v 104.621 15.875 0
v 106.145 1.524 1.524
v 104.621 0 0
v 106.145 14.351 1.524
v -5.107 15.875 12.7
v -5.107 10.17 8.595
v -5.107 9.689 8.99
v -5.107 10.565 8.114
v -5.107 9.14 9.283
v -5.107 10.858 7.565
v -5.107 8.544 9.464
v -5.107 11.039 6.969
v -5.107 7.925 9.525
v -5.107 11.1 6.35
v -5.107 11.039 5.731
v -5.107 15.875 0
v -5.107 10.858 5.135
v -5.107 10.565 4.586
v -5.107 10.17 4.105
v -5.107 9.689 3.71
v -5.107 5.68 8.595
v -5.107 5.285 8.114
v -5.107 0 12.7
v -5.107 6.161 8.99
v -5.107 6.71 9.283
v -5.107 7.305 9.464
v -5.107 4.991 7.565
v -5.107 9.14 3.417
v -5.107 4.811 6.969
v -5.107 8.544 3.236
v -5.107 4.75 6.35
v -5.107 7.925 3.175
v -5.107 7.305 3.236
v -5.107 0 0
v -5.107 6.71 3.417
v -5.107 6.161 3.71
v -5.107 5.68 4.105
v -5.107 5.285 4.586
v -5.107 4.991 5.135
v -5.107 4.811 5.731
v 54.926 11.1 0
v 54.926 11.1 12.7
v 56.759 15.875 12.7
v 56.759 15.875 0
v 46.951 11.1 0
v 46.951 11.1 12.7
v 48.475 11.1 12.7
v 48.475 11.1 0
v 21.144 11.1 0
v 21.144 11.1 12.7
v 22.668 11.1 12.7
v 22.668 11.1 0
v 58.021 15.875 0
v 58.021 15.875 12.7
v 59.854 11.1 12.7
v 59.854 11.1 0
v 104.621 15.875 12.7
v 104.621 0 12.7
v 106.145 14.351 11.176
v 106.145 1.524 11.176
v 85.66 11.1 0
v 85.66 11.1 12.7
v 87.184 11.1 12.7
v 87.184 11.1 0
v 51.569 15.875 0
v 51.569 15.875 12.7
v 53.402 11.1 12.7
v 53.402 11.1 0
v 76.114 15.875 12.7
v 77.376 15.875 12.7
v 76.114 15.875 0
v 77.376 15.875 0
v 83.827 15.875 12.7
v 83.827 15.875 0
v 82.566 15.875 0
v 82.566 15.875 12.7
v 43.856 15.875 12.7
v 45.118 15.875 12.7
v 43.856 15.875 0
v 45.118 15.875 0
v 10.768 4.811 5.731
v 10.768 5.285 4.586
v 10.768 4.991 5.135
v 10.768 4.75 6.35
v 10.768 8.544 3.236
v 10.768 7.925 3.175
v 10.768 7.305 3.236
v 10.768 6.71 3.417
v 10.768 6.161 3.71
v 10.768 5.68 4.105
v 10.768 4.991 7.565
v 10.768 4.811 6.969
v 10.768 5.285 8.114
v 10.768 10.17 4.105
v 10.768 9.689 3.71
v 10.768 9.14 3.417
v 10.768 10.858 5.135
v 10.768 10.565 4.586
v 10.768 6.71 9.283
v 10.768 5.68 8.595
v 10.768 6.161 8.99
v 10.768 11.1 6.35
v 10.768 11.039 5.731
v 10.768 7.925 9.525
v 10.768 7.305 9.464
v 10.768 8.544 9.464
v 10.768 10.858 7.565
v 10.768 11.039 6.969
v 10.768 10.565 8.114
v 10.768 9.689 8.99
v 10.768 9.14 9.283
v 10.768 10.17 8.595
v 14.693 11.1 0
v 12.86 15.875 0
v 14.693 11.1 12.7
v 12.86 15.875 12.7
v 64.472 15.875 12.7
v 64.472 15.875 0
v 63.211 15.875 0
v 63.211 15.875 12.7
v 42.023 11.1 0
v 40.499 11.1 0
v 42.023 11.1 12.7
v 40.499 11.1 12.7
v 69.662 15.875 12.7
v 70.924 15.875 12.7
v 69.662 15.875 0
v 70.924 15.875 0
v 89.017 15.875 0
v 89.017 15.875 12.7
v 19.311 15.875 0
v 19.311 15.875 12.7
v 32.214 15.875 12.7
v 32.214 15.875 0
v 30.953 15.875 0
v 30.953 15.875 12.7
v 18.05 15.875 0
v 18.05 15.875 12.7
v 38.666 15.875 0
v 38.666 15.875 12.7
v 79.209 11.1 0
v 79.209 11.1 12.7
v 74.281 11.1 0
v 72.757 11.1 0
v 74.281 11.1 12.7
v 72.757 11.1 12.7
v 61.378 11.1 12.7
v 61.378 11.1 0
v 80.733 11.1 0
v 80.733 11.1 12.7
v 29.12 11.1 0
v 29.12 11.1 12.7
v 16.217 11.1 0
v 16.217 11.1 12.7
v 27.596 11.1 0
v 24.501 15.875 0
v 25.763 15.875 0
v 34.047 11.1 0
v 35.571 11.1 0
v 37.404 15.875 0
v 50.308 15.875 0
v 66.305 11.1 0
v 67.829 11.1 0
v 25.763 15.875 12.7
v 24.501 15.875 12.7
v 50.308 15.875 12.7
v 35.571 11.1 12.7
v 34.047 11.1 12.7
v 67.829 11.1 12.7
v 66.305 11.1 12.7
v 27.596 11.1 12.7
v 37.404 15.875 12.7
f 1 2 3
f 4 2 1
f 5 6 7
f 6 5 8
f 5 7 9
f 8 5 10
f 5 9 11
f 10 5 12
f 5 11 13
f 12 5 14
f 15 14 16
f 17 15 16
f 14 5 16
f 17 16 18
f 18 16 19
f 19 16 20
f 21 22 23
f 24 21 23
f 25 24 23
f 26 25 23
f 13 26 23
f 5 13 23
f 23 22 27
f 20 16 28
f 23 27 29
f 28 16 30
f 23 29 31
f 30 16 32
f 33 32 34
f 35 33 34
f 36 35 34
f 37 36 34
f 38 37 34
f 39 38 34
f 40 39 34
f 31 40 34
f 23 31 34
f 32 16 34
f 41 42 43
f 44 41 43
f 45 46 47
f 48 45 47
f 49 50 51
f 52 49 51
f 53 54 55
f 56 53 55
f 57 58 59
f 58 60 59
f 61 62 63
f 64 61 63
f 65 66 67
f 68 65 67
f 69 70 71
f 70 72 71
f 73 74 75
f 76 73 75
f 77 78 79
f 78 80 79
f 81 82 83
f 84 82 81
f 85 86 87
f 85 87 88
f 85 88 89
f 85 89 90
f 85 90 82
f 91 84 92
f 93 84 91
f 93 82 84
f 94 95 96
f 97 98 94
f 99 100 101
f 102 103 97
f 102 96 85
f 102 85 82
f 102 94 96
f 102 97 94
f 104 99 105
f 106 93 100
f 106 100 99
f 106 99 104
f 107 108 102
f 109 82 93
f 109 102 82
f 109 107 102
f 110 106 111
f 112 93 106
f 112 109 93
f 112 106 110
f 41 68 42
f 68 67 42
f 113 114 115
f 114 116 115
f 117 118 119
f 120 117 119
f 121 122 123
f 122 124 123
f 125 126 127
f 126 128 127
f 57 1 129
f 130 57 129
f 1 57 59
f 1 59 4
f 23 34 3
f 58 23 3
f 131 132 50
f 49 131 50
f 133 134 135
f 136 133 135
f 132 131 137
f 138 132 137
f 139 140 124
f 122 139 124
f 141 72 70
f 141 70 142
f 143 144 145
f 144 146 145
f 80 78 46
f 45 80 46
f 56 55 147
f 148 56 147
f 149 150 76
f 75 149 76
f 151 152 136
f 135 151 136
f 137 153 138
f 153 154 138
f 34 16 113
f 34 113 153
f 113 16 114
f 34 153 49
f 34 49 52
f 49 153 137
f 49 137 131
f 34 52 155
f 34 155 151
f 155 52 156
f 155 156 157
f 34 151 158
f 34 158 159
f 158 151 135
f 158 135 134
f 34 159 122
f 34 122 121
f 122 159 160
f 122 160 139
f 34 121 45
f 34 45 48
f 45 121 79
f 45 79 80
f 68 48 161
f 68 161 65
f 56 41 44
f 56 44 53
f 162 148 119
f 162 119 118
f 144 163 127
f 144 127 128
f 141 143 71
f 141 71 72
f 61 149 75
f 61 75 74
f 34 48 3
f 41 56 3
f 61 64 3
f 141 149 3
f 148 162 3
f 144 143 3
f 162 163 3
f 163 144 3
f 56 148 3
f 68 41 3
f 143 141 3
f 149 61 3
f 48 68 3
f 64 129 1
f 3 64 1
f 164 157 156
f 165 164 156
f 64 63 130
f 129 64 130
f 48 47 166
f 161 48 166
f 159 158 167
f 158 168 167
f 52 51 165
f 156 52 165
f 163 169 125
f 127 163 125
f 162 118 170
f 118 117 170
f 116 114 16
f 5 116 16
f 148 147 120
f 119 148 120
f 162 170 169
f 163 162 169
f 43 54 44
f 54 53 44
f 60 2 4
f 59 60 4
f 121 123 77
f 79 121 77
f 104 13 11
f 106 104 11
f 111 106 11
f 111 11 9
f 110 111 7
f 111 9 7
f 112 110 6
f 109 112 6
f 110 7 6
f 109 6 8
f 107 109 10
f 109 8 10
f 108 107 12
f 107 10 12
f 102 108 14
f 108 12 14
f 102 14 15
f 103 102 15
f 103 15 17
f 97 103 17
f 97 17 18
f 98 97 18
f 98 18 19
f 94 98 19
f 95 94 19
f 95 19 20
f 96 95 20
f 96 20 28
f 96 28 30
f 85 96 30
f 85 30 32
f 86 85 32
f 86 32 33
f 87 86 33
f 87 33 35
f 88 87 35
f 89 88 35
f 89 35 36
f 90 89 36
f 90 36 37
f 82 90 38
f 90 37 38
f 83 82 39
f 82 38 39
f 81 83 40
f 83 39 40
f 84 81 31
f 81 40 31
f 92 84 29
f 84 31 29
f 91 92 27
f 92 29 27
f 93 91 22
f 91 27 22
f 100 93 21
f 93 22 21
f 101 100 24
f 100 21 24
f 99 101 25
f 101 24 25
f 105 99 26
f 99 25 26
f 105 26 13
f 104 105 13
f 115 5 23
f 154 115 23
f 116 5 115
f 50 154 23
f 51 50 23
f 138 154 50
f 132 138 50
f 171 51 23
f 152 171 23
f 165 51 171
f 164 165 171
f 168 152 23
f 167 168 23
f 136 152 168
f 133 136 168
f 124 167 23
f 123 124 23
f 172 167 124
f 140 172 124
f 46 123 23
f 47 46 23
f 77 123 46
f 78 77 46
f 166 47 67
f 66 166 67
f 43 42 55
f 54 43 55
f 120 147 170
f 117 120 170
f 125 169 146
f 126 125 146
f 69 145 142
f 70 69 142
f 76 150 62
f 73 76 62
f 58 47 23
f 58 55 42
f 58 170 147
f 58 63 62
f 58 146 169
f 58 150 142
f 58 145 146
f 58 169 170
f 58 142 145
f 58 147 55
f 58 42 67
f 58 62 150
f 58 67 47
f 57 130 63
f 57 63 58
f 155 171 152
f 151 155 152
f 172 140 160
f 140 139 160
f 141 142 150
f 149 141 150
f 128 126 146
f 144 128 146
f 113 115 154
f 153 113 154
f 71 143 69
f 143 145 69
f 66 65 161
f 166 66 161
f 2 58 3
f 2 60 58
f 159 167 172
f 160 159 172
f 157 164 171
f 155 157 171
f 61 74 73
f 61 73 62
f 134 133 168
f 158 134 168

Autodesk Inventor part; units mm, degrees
ref_plane "YZ Plane" through (0, 0, 0) normal (1, 0, 0) x (0, 1, 0)
ref_plane "XZ Plane" through (0, 0, 0) normal (0, 1, 0) x (-1, 0, 0)
ref_plane "XY Plane" through (0, 0, 0) normal (0, 0, 1) x (1, 0, 0)
sketch "Sketch1" plane through (0, 0, 0) normal (0, 0, 1) x (1, 0, 0)
  line L0 (-5.1073, 0) -> (106.1447, 0)
  line L1 (106.1447, 0) -> (106.1447, 15.875)
  line L2 (106.1447, 15.875) -> (-5.1073, 15.875)
  line L3 (-5.1073, 15.875) -> (-5.1073, 0)
  point P0 (0, 0)
  dimension "d0" = 111.252
  dimension "d1" = 15.875
extrude "Extrusion1" add sketch "Sketch1" along normal blind 12.7
sketch "Sketch2" plane through (0, 0, 12.7) normal (0, 0, 1) x (1, 0, 0)
  line L0 (106.1447, 15.875) -> (-5.1073, 15.875) projected
  line L1 (12.8596, 15.875) -> (14.6926, 11.0998)
  line L2 (-5.1073, 0) -> (106.1447, 0) projected
  line L3 (14.6926, 11.0998) -> (16.2166, 11.0998)
  line L4 (16.2166, 11.0998) -> (18.0497, 15.875)
  point P0 (0, 0)
  dimension "d4" = 17.9669
  dimension "d5" = 11.0998
  dimension "d6" = 11.0998
  dimension "d10" = 42
  dimension "d11" = 1.524
extrude "Extrusion2" cut sketch "Sketch2" against normal blind 12.7
pattern_linear "Rectangular Pattern1" count 12 spacing 6.4516 along (1, 0, 0) of "Extrusion2"
chamfer "Chamfer1" distance 1.524 angle 45 4 edges at (106.1447, 7.9375, 12.7) (106.1447, 15.875, 6.35) (106.1447, 7.9375, 0) (106.1447, 0, 6.35)
sketch "Sketch3" plane through (-5.1073, 0, 0) normal (-1, 0, 0) x (0, 0, 1)
  circle A0 centre (6.35, 7.9248) radius 3.175
  line L0 (0, 15.875) -> (12.7, 15.875) projected
  line L1 (0, 15.875) -> (0, 0) projected
  dimension "d20" = 6.35
  dimension "d21" = 7.9502
  dimension "d22" = 6.35
extrude "Extrusion3" cut sketch "Sketch3" against normal blind 15.875
properties part number "Gear Rack" material "Stainless Steel"
